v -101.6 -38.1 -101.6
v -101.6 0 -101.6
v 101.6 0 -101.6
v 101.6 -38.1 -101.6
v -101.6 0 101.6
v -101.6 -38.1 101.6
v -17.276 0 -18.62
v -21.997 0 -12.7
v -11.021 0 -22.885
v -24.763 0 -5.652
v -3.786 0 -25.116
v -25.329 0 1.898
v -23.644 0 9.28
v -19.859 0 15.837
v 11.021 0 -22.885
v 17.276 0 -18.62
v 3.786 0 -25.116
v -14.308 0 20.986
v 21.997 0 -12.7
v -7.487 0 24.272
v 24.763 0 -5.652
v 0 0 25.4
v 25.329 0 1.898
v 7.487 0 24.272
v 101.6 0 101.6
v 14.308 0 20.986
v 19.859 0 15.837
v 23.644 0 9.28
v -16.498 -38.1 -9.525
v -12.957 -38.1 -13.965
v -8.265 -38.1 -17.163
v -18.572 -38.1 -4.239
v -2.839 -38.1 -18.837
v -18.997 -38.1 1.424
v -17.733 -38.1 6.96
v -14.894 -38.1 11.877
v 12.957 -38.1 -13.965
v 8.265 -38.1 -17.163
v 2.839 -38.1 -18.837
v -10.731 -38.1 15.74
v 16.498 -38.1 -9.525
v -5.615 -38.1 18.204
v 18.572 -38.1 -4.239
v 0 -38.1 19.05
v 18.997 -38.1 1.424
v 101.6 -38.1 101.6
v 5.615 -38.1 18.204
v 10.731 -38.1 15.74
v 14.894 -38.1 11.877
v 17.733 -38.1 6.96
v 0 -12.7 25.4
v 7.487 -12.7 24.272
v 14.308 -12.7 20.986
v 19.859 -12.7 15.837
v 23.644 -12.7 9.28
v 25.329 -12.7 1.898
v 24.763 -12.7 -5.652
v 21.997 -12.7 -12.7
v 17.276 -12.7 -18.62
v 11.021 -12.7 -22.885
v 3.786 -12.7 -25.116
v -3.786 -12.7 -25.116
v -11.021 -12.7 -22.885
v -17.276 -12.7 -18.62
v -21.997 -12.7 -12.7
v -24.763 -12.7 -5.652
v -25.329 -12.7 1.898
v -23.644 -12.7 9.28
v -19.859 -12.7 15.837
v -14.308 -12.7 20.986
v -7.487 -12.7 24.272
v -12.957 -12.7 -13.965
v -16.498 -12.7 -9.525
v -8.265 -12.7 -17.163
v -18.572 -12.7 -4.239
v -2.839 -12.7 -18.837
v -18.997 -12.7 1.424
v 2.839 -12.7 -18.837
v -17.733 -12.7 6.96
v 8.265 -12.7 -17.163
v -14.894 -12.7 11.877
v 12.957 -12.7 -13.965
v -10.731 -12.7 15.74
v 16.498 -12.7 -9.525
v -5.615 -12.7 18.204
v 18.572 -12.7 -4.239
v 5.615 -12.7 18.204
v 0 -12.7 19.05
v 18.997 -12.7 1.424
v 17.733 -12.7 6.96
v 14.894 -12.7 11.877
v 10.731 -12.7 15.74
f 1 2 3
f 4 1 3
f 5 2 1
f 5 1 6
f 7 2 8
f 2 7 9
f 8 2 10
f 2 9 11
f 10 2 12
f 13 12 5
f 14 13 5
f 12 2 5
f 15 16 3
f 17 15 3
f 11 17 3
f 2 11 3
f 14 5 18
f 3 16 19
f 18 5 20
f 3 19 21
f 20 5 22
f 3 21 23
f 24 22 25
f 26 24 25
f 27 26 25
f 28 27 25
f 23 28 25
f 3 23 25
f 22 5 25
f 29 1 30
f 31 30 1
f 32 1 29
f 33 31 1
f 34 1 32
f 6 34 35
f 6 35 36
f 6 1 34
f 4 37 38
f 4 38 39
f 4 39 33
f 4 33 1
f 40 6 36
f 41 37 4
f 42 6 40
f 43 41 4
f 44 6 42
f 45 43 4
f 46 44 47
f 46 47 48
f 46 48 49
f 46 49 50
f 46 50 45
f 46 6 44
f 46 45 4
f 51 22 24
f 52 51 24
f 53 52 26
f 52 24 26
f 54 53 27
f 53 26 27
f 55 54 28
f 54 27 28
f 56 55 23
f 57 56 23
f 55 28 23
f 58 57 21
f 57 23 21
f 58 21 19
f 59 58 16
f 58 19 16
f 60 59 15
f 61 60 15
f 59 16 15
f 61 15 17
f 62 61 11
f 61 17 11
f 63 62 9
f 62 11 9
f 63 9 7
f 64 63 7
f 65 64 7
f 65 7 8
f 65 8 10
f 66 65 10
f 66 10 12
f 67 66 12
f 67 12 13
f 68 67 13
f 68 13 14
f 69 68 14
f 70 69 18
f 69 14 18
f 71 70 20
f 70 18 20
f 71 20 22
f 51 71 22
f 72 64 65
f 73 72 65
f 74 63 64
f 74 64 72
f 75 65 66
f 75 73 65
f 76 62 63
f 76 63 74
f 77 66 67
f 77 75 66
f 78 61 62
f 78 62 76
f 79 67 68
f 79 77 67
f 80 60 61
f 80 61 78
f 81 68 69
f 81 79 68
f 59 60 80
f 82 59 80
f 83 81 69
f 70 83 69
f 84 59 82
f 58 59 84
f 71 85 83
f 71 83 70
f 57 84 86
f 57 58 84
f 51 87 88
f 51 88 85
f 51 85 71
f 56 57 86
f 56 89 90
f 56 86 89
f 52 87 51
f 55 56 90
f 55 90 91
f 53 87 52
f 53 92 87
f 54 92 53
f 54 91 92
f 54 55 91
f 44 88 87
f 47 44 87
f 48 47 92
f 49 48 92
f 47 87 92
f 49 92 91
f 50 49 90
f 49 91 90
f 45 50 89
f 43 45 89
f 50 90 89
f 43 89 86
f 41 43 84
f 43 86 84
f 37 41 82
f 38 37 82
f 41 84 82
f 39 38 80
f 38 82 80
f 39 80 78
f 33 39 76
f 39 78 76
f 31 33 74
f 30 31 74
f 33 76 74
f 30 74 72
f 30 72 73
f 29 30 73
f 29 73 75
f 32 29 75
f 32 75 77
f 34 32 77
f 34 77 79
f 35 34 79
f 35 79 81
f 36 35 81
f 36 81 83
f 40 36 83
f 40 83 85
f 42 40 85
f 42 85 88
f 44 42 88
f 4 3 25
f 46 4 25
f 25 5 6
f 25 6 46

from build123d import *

# Parameters (mm, degrees)
SKETCH1_W           = 203.2
SKETCH1_H           = 203.2
BOSS_EXTRUDE1_DEPTH = 38.1
SKETCH2_R           = 25.4
CUT_EXTRUDE1_DEPTH  = 12.7
SKETCH3_R           = 19.05
CUT_EXTRUDE2_DEPTH  = 146.911891222


with BuildPart() as part:
    # Sketch1 → Boss-Extrude1 (new body)
    with BuildSketch(Plane.XZ):
        Rectangle(SKETCH1_W, SKETCH1_H)
    extrude(amount=BOSS_EXTRUDE1_DEPTH)

    # Sketch2 → Cut-Extrude1 (cut)
    with BuildSketch(Plane(origin=(0, 0, 0), x_dir=(1, 0, 0), z_dir=(0, 1, 0))):
        with Locations(Location((0, 0, 0), (0, 0, 270))):
            Circle(SKETCH2_R)
    extrude(amount=-CUT_EXTRUDE1_DEPTH, mode=Mode.SUBTRACT)

    # Sketch3 → Cut-Extrude2 (cut, through all)
    with BuildSketch(Plane(origin=(0, -12.7, 0), x_dir=(1, 0, 0), z_dir=(0, 1, 0))):
        with Locations(Location((0, 0, 0), (0, 0, 270))):
            Circle(SKETCH3_R)
    extrude(amount=-CUT_EXTRUDE2_DEPTH, mode=Mode.SUBTRACT)


solid = part.part
